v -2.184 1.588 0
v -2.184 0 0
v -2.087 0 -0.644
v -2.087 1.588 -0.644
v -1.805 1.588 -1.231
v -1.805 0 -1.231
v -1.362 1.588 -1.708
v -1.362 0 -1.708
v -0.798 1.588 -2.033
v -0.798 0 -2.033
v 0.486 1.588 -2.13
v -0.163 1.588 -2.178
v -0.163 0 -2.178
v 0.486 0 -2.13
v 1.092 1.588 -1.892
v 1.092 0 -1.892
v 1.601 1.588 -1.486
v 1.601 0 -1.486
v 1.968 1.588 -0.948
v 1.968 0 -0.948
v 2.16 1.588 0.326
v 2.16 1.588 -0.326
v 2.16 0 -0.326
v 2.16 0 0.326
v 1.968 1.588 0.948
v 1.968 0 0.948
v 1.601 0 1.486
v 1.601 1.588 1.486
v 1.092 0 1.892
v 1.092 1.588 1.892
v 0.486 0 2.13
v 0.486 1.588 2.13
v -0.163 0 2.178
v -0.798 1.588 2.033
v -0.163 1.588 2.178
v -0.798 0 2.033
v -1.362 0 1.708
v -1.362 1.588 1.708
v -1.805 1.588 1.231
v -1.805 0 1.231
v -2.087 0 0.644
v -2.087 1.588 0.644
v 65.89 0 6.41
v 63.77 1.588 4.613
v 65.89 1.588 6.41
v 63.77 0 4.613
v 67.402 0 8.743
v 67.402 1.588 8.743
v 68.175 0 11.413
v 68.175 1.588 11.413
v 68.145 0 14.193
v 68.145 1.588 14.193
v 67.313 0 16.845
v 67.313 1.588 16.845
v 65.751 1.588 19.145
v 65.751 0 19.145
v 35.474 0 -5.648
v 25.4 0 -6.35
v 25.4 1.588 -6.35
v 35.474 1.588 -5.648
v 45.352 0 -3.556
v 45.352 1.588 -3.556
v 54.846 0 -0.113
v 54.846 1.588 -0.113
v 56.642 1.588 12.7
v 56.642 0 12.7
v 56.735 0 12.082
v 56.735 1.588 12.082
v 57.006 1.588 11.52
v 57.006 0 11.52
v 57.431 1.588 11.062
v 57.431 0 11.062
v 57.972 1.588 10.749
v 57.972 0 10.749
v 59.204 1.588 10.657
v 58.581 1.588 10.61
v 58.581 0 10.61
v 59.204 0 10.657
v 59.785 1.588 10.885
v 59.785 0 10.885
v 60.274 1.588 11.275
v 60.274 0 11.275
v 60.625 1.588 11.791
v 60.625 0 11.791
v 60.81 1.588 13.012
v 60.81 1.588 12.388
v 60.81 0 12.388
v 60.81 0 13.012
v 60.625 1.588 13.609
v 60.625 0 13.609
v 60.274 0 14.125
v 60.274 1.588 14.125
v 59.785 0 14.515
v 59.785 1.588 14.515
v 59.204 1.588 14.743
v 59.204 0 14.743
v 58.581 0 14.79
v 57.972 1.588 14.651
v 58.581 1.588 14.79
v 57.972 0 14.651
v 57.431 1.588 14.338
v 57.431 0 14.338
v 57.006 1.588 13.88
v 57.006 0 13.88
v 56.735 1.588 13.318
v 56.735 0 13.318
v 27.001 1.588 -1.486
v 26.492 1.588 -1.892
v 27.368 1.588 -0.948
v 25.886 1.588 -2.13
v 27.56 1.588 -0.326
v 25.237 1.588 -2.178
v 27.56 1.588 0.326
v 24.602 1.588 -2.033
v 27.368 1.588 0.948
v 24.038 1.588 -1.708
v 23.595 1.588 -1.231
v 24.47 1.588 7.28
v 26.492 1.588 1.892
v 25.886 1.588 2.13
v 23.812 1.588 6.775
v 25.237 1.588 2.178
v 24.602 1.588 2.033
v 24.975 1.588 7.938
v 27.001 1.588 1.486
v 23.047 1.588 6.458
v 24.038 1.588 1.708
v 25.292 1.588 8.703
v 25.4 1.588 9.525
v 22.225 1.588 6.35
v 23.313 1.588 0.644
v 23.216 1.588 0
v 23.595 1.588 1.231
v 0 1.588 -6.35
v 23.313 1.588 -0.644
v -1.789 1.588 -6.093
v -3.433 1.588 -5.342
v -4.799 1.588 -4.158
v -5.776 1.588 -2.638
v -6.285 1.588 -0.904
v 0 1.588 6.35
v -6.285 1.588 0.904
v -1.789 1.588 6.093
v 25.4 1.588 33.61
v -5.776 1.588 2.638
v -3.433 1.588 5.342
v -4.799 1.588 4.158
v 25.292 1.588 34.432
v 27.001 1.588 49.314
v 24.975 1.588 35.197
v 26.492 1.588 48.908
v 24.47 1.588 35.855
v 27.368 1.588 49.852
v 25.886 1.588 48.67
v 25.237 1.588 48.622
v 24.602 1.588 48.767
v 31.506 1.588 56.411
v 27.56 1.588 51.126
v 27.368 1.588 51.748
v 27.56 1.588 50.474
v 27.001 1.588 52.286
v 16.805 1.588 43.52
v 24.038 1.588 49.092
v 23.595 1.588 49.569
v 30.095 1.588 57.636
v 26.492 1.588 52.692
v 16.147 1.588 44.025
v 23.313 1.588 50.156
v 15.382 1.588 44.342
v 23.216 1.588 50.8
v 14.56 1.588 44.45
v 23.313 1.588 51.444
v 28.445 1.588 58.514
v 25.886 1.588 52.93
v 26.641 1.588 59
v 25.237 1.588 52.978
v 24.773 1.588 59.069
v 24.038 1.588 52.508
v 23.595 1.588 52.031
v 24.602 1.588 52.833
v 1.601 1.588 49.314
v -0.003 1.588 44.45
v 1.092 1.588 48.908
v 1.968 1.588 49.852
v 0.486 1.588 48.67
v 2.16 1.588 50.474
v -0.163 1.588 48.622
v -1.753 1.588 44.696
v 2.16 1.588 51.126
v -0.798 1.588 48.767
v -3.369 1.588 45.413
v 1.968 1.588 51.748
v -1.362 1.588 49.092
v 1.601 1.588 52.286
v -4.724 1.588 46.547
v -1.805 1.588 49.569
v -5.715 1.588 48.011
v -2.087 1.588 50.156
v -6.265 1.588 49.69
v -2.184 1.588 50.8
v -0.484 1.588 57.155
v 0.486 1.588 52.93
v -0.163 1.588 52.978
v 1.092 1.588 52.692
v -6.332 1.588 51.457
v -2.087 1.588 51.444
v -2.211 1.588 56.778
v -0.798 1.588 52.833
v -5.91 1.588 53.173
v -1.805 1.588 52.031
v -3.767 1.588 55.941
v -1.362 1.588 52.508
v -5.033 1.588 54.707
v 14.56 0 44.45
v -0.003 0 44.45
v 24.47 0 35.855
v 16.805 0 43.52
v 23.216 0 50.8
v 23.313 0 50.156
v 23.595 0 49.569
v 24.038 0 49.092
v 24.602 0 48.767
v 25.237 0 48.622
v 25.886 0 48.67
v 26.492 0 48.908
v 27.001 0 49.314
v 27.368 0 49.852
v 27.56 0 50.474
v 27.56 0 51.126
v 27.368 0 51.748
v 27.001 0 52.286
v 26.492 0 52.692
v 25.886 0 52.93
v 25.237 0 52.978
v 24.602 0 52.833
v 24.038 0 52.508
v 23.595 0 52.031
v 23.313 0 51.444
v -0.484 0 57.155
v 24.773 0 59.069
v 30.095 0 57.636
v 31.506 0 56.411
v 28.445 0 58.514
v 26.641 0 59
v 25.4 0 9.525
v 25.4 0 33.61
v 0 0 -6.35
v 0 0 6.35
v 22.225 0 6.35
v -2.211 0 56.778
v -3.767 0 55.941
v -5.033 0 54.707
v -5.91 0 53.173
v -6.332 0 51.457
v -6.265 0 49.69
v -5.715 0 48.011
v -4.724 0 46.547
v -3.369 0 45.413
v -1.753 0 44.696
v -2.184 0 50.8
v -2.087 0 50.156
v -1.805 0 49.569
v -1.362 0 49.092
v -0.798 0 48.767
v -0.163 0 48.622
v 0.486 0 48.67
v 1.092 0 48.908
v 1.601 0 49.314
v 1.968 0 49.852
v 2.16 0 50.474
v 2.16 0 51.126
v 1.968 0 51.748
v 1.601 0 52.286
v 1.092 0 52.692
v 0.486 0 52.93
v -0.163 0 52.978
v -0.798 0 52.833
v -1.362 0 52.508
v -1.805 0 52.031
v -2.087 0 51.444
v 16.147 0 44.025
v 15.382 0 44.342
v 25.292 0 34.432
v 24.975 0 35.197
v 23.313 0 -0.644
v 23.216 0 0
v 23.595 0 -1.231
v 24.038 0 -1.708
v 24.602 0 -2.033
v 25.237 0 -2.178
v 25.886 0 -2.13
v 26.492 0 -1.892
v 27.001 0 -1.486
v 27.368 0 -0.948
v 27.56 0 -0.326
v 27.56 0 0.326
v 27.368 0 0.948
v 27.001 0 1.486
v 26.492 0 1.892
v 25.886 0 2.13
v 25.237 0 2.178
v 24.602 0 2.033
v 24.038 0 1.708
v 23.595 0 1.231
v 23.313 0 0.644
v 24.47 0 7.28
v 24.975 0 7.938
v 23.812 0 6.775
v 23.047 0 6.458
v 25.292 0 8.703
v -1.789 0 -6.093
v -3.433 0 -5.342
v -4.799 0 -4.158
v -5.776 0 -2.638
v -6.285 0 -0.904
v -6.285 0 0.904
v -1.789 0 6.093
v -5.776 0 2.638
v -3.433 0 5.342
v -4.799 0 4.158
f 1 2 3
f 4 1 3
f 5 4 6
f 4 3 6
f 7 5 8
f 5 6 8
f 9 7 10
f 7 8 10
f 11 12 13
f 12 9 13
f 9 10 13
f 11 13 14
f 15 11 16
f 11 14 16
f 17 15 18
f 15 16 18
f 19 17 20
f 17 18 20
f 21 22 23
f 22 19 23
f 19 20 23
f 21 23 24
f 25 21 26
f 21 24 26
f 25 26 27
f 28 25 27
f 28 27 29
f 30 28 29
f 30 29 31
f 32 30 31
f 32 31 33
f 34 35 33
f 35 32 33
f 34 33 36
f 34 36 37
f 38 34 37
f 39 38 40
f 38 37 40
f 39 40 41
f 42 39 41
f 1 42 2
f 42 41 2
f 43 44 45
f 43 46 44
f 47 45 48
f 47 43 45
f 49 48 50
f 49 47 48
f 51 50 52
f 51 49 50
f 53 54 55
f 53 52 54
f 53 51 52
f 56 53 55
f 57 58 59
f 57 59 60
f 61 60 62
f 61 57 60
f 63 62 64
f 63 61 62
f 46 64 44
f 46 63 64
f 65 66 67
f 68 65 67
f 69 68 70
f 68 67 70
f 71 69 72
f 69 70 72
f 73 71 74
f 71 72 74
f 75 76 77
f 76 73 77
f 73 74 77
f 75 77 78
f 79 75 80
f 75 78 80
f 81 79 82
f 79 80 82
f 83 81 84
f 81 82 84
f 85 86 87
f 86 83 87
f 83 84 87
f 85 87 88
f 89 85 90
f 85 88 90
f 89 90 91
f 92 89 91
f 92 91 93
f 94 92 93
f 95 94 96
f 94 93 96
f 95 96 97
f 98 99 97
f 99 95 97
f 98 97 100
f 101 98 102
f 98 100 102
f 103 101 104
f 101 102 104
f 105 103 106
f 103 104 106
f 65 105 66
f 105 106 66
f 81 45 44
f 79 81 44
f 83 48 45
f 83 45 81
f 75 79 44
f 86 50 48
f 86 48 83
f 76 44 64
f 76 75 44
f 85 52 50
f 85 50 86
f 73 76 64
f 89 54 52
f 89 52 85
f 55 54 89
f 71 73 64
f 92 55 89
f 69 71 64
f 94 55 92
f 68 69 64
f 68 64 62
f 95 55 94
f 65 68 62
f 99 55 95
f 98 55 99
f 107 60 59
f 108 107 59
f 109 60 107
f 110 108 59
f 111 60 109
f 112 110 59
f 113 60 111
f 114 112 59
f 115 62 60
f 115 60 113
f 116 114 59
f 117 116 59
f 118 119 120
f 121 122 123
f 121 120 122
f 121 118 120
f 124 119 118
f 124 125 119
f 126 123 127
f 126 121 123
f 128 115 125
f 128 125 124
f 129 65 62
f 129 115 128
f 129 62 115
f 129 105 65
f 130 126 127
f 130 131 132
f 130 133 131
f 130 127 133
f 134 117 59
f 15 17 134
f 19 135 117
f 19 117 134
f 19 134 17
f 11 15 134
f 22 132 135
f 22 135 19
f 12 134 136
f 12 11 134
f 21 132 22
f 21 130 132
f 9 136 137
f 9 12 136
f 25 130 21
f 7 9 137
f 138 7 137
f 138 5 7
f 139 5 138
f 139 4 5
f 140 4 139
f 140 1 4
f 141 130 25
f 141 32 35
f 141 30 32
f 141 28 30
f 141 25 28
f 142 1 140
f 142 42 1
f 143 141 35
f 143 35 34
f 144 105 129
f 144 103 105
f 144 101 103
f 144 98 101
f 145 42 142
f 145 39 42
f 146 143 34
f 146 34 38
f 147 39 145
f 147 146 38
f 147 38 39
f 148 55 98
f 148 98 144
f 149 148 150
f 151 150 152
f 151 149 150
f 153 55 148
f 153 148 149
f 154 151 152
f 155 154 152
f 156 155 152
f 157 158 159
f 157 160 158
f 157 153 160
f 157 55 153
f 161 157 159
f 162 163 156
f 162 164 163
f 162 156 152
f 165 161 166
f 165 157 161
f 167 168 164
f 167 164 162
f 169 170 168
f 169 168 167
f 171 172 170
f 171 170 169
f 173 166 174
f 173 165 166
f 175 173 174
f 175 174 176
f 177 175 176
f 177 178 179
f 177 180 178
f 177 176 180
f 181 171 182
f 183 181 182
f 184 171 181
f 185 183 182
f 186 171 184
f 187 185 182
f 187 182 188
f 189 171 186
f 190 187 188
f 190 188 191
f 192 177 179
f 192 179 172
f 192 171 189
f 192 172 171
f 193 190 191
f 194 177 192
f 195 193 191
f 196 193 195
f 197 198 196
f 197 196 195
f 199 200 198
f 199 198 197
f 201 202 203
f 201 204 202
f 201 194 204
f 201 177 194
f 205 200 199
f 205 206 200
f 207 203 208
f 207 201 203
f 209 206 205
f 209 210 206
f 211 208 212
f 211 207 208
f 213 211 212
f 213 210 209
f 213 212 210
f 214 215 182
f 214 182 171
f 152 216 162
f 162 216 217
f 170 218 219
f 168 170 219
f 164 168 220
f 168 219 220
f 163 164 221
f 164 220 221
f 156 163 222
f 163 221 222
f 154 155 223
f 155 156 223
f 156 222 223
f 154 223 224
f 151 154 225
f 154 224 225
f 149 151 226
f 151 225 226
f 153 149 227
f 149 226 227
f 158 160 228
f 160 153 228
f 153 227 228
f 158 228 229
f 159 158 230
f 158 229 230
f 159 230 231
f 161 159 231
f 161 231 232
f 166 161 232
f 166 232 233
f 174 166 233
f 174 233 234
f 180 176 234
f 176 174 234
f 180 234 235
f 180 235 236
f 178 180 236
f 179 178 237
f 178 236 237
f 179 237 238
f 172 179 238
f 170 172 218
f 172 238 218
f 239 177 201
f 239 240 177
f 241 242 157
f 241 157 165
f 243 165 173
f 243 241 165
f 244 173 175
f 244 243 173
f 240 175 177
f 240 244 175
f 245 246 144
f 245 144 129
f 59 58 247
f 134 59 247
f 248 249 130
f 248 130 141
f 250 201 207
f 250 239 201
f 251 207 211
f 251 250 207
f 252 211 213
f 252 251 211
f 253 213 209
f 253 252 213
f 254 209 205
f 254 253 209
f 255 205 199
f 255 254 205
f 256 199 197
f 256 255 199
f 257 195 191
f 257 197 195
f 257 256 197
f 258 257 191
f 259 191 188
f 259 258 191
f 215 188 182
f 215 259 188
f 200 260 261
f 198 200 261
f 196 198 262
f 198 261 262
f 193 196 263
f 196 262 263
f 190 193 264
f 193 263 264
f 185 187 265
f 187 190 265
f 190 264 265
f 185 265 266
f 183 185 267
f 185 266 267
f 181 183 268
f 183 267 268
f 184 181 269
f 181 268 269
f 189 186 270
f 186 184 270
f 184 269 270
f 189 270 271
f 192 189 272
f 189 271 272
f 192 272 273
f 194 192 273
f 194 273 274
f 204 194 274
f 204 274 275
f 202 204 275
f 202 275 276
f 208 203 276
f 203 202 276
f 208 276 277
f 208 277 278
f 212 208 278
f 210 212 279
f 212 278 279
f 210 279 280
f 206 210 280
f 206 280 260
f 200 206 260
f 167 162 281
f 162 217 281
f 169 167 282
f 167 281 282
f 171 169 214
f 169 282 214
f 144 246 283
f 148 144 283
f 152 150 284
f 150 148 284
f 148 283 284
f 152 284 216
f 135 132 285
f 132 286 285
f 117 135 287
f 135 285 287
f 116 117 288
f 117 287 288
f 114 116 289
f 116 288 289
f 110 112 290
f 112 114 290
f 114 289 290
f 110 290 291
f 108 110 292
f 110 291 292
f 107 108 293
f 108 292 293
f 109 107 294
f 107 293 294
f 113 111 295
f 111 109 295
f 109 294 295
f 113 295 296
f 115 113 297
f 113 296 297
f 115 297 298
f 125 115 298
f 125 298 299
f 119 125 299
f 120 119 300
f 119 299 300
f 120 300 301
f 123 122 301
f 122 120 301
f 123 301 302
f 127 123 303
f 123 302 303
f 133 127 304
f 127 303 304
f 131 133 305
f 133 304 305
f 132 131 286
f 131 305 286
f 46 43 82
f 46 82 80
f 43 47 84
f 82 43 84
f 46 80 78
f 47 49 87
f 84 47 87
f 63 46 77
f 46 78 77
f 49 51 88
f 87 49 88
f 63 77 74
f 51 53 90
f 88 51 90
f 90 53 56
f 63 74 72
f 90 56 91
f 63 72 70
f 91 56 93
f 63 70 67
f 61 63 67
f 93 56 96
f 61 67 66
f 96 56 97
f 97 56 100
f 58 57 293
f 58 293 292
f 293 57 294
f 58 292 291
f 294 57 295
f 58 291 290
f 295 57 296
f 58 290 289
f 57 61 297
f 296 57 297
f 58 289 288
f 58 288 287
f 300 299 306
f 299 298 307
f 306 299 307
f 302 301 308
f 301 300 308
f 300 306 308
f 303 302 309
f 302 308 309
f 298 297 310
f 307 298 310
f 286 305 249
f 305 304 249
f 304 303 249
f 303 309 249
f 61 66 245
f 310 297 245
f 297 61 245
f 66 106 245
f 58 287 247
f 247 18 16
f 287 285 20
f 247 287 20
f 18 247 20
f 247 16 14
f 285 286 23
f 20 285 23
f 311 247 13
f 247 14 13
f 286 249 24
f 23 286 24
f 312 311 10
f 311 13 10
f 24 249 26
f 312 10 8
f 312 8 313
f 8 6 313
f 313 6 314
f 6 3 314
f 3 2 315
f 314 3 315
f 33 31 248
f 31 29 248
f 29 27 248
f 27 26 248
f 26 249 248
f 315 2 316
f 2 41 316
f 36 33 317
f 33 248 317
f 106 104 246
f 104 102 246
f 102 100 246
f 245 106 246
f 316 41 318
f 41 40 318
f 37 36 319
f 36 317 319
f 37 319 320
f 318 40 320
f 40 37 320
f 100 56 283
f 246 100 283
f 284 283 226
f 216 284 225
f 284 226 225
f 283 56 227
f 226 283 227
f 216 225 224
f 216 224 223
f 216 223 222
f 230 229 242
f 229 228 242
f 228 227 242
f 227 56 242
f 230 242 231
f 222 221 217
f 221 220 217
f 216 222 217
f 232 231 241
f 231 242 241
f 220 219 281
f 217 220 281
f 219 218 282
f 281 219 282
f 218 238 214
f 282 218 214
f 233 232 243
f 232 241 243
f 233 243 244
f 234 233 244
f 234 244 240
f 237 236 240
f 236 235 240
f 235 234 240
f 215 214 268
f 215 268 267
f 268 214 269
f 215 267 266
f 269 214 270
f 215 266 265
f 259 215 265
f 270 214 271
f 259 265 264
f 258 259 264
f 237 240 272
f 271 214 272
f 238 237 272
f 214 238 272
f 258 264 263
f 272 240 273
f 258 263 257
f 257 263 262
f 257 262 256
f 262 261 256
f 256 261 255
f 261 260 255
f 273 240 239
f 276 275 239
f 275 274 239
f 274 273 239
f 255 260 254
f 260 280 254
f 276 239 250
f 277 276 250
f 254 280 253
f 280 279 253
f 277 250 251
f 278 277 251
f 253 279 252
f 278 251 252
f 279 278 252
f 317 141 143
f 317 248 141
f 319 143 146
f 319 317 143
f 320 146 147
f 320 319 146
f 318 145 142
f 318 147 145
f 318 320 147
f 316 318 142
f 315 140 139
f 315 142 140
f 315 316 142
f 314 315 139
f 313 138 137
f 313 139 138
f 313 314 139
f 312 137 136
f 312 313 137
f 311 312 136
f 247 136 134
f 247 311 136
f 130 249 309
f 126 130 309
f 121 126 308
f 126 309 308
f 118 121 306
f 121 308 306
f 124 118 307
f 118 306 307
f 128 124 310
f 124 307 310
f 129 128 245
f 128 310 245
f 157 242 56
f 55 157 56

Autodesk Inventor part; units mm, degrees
ref_plane "YZ Plane" through (0, 0, 0) normal (1, 0, 0) x (0, 1, 0)
ref_plane "XZ Plane" through (0, 0, 0) normal (0, 1, 0) x (-1, 0, 0)
ref_plane "XY Plane" through (0, 0, 0) normal (0, 0, 1) x (1, 0, 0)
sketch "main" plane through (0, 0, 0) normal (0, 0, 1) x (1, 0, 0)
  circle A0 centre (7.297, 24.2073) radius 2.1844
  arc A1 (32.7001, 17.8573) -> (32.7001, 30.5808) centre (32.7001, 24.219) ccw
  line L0 (8.227, 9.2622) -> (15.8921, 16.9273)
  arc A2 (18.1371, 17.8573) -> (15.8921, 16.9273) centre (18.1371, 14.6823) ccw
  line L1 (32.7001, 17.8573) -> (18.1371, 17.8573)
  circle A3 centre (32.697, 24.2073) radius 2.1844
  line L2 (7.9237, 32.4766) -> (33.1809, 30.5626)
  arc A4 (7.9237, 32.4766) -> (1.1906, 29.8185) centre (7.297, 24.2073) ccw
  circle A5 centre (7.297, -26.5927) radius 2.1844
  arc A6 (-33.054, -7.4479) -> (-31.0726, -21.98) centre (-26.0405, -13.8927) ccw
  line L3 (1.381, 30.0257) -> (-33.054, -7.4479)
  arc A7 (-31.0726, -21.98) -> (7.297, -32.9427) centre (7.297, 39.6854) ccw
  line L4 (7.297, -32.9427) -> (32.697, -32.9427)
  arc A8 (32.697, -32.9427) -> (32.697, -20.2427) centre (32.697, -26.5927) ccw
  circle A9 centre (-26.0405, -13.8927) radius 2.0955
  line L5 (7.297, 7.0171) -> (7.297, -17.0677)
  arc A10 (7.297, -17.0677) -> (10.472, -20.2427) centre (10.472, -17.0677) ccw
  line L6 (10.472, -20.2427) -> (32.697, -20.2427)
  circle A11 centre (32.697, -26.5927) radius 2.1844
  arc A12 (8.227, 9.2622) -> (7.297, 7.0171) centre (10.472, 7.0171) ccw
  point P0 (10.5963, 4.2161)
  point P1 (16.822, 17.8573)
  point P2 (7.297, 8.3323)
  point P3 (1.963, 30.5573)
  point P4 (7.297, 17.8573)
  dimension "d0" = 9.525
  dimension "d1" = 9.525
  dimension "d2" = 3.175
  dimension "d3" = 4.191
  dimension "d4" = 3.175
sketch "Sketch1" plane through (0, 0, 0) normal (0, 1, 0) x (-1, 0, 0)
  circle A0 centre (-25.4, 50.8) radius 2.1844
  arc A1 (0.0031, 44.45) -> (0.0031, 57.1735) centre (0.0031, 50.8118) ccw
  line L0 (-24.4701, 35.8549) -> (-16.8049, 43.5201)
  arc A2 (-14.5599, 44.45) -> (-16.8049, 43.5201) centre (-14.5599, 41.275) ccw
  line L1 (0.0031, 44.45) -> (-14.5599, 44.45)
  circle A3 centre (0, 50.8) radius 2.1844
  line L2 (-24.7734, 59.0693) -> (0.4838, 57.1553)
  arc A4 (-24.7734, 59.0693) -> (-31.5064, 56.4112) centre (-25.4, 50.8) ccw
  circle A5 centre (-25.4, 0) radius 2.1844
  arc A6 (-65.751, 19.1448) -> (-63.7696, 4.6127) centre (-58.7375, 12.7) ccw
  line L3 (-31.316, 56.6184) -> (-65.751, 19.1448)
  arc A7 (-63.7696, 4.6127) -> (-25.4, -6.35) centre (-25.4, 66.2781) ccw
  line L4 (-25.4, -6.35) -> (0, -6.35)
  arc A8 (0, -6.35) -> (0, 6.35) centre (0, 0) ccw
  circle A9 centre (-58.7375, 12.7) radius 2.0955
  line L5 (-25.4, 33.6099) -> (-25.4, 9.525)
  arc A10 (-25.4, 9.525) -> (-22.225, 6.35) centre (-22.225, 9.525) ccw
  line L6 (-22.225, 6.35) -> (0, 6.35)
  circle A11 centre (0, 0) radius 2.1844
  arc A12 (-24.4701, 35.8549) -> (-25.4, 33.6099) centre (-22.225, 33.6099) ccw
extrude "Extrusion1" add sketch "Sketch1" along normal blind 1.5875
equation "\"d1\" = d0"
properties part number "gusset" material "Acetal Resin, White"
